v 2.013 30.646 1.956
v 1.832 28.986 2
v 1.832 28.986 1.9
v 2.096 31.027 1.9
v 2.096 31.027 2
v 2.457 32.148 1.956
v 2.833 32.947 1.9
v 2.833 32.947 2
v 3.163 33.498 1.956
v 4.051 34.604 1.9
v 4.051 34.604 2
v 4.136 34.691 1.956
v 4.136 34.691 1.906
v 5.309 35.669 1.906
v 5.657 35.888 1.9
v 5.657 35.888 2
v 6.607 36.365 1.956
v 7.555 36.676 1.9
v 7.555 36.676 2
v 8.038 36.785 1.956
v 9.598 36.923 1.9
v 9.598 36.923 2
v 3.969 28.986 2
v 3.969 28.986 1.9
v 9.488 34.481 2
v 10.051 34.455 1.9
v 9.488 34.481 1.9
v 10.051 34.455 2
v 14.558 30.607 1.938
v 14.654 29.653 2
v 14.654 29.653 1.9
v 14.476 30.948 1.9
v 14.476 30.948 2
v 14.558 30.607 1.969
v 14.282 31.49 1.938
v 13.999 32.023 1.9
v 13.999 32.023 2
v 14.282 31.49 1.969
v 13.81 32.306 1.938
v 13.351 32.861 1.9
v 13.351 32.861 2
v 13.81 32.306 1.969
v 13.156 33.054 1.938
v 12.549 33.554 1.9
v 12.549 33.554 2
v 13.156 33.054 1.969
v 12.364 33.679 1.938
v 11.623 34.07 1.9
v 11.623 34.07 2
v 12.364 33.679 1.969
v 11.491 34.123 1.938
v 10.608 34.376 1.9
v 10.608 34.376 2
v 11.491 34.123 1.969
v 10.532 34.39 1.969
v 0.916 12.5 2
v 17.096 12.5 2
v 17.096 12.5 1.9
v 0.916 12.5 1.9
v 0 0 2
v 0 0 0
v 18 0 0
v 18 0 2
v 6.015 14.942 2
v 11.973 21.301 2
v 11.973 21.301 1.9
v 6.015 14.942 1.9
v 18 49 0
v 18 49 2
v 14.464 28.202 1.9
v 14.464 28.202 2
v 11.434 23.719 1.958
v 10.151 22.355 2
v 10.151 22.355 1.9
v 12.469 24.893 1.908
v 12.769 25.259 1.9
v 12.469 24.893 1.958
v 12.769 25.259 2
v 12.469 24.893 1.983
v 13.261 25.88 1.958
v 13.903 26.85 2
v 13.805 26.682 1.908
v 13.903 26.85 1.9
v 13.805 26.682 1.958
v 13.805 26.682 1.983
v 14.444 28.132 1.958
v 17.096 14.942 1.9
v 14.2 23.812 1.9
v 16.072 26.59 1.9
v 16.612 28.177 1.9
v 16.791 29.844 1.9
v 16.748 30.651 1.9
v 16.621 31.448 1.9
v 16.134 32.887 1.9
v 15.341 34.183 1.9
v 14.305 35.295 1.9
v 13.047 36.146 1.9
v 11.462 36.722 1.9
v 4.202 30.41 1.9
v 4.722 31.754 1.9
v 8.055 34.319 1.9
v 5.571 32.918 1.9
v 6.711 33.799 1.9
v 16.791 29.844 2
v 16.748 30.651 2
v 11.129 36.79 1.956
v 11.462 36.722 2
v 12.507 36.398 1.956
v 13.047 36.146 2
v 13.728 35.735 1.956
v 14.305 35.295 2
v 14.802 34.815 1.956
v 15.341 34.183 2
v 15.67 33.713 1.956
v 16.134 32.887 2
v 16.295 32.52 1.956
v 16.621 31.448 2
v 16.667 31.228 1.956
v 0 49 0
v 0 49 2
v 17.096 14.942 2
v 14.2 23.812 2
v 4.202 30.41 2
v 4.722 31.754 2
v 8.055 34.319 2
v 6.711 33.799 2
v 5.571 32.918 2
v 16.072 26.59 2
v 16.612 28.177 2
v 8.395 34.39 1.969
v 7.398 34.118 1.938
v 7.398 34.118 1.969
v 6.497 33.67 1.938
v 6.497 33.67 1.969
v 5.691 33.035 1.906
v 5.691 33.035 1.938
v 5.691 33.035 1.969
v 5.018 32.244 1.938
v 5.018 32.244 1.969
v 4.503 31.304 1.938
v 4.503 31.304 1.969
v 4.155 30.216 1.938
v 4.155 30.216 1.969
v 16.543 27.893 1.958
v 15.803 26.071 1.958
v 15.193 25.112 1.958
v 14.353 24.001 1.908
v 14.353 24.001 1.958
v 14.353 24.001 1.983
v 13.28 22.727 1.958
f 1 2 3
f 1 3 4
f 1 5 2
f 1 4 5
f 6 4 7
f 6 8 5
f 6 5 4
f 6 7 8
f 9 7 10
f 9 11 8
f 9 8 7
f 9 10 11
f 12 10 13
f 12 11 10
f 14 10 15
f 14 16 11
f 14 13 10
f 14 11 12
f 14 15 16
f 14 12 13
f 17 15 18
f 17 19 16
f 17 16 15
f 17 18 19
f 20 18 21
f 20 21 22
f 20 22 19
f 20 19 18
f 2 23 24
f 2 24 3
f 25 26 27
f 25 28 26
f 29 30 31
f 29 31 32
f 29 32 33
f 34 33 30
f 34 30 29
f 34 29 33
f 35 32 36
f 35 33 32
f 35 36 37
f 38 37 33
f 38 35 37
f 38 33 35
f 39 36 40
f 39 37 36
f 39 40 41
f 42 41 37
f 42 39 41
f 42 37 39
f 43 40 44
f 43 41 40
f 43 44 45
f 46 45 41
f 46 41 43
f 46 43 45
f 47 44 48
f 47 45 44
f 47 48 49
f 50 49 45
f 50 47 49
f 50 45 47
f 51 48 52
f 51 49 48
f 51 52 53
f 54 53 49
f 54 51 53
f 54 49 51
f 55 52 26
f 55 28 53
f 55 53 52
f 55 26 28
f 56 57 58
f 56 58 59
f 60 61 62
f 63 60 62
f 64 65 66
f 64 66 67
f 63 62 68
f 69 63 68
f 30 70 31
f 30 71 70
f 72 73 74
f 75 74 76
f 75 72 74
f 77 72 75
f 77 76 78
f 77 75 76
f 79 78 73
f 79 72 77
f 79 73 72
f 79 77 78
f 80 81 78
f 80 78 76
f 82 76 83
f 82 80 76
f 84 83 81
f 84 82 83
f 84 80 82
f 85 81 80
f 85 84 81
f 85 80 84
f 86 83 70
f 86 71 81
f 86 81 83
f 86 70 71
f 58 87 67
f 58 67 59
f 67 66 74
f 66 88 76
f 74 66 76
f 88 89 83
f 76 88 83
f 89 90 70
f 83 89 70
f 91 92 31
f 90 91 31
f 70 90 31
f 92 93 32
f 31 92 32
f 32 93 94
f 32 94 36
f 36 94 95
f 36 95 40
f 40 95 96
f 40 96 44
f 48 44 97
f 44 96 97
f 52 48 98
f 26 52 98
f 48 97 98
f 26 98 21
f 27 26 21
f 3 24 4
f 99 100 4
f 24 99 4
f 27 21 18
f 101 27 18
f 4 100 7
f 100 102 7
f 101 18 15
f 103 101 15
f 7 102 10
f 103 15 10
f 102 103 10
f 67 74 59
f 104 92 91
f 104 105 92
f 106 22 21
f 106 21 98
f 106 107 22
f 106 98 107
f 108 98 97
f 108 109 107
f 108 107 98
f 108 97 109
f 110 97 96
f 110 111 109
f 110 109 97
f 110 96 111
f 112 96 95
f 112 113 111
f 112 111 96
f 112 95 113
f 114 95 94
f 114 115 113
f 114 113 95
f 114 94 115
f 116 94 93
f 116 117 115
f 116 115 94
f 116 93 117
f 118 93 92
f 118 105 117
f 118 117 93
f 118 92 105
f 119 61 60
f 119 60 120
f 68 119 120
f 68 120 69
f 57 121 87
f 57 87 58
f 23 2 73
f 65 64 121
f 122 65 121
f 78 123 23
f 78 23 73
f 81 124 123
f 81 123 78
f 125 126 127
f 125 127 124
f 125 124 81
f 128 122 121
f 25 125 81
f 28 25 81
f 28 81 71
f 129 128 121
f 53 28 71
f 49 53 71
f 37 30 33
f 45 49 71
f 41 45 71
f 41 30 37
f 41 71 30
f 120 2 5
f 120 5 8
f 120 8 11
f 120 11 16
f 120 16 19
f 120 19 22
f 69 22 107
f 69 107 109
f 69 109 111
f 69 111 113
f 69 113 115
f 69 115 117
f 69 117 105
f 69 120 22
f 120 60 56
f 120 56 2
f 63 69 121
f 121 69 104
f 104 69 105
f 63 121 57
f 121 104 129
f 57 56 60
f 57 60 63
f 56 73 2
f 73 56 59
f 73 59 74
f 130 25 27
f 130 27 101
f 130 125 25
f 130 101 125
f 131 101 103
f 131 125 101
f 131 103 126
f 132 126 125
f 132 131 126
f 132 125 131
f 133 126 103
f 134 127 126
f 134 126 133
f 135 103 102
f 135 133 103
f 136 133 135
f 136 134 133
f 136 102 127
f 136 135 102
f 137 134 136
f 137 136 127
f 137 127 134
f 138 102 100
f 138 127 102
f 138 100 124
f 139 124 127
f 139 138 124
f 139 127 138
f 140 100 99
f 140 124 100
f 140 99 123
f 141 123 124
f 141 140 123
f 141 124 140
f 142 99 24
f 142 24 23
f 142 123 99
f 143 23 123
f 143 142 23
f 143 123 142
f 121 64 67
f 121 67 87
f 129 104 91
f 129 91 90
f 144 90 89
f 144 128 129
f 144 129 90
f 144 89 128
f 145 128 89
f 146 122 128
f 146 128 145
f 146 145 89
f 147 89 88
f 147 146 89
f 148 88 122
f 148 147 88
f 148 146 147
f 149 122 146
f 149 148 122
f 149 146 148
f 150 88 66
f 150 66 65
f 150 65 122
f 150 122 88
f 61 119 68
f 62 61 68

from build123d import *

# Parameters (mm, degrees)
SKETCH_1_W          = 18
SKETCH_1_H          = 49
EXTRUDE_1_DEPTH     = 2
CUT_EXTRUDE_1_DEPTH = 0.1


with BuildPart() as part:
    # ｽｹｯﾁ1 → ﾎﾞｽ - 押し出し1 (new body)
    with BuildSketch(Plane.XY):
        with Locations((9, 24.5)):
            Rectangle(SKETCH_1_W, SKETCH_1_H)
    extrude(amount=EXTRUDE_1_DEPTH)

    # ｽｹｯﾁ2 → ｶｯﾄ - 押し出し1 (cut)
    with BuildSketch(Plane.XY.offset(2)):
        with BuildLine():
            Line((3.96875, 28.985576923), (1.831730769, 28.985576923))
            add(Edge.make_bspline(
                [(1.831730769, 28.985576923), (1.845658721, 29.269087784), (1.873012847, 29.825895571), (2.001112458, 30.637724291), (2.184406641, 31.413704261), (2.443564569, 32.147604926), (2.765416209, 32.845915382), (3.151383002, 33.505861918), (3.608541164, 34.12492697), (4.127019122, 34.6973716), (4.69014147, 35.222522751), (5.297740808, 35.676016457), (5.936222155, 36.059177756), (6.603648422, 36.379498348), (7.307549757, 36.619935514), (8.041538486, 36.798336312), (8.808839396, 36.905671807), (9.331625975, 36.917209206), (9.59750601, 36.923076923)],
                knots=[0, 0, 0, 0, 1.10065271, 2.161652631, 3.183658789, 4.190468796, 5.17591951, 6.163126047, 7.15150782, 8.156236427, 9.156009102, 10.134482811, 11.092018607, 12.041330605, 13.001268258, 13.972401359, 14.968799086, 16, 16, 16, 16], degree=3))
            add(Edge.make_bspline(
                [(9.59750601, 36.923076923), (9.858613978, 36.91696421), (10.371681809, 36.904952949), (11.120496585, 36.801803803), (11.833356392, 36.640248974), (12.508867804, 36.41358516), (13.141641208, 36.108891109), (13.736430136, 35.742875712), (14.300315652, 35.319558645), (14.807908233, 34.821171093), (15.274007844, 34.289115584), (15.676114258, 33.721099669), (16.020464531, 33.134432564), (16.307491425, 32.524640692), (16.518784084, 31.885982446), (16.679200107, 31.227755941), (16.769874118, 30.543147852), (16.783790303, 30.079780036), (16.790865385, 29.844200721)],
                knots=[0, 0, 0, 0, 1.111607364, 2.184268762, 3.212621178, 4.221274766, 5.211760367, 6.196651075, 7.1921475, 8.207485113, 9.220403448, 10.201281604, 11.166441695, 12.114753415, 13.065576456, 14.026450734, 14.996634279, 16, 16, 16, 16], degree=3))
            add(Edge.make_bspline(
                [(16.790865385, 29.844200721), (16.77934515, 29.512541347), (16.756506844, 28.85504275), (16.561146532, 27.888834487), (16.25603009, 26.952707833), (15.888655216, 26.199298688), (15.518048052, 25.592192239), (15.184077688, 25.092342658), (14.793111742, 24.554142953), (14.339459818, 23.979395354), (13.83250617, 23.363597946), (13.267658951, 22.707122731), (12.640890261, 22.016752297), (12.200981533, 21.545226688), (11.973031851, 21.30089393)],
                knots=[0, 0, 0, 0, 1.184426356, 2.348067706, 3.509069118, 4.696110526, 5.333549288, 6.050745305, 6.844228056, 7.710549037, 8.667450064, 9.695053472, 10.805634456, 12, 12, 12, 12], degree=3))
            Line((11.973031851, 21.30089393), (6.015136719, 14.942307692))
            Line((6.015136719, 14.942307692), (17.096153846, 14.942307692))
            Line((17.096153846, 14.942307692), (17.096153846, 12.5))
            Line((17.096153846, 12.5), (0.915865385, 12.5))
            Line((0.915865385, 12.5), (10.150841346, 22.355093149))
            add(Edge.make_bspline(
                [(10.150841346, 22.355093149), (10.375685005, 22.589804842), (10.807563657, 23.040637969), (11.418405831, 23.698835608), (11.967038948, 24.309453019), (12.457014424, 24.871336501), (12.877703095, 25.392704846), (13.251030244, 25.856672383), (13.550153283, 26.283626768), (13.874788385, 26.77852273), (14.189208509, 27.382763674), (14.45939436, 28.121180381), (14.624141811, 28.881324725), (14.643905067, 29.395008227), (14.653846154, 29.653395433)],
                knots=[0, 0, 0, 0, 1.329631726, 2.553950428, 3.673215718, 4.687767853, 5.603093632, 6.413772471, 7.123043292, 7.734684054, 8.834405432, 9.900288307, 10.943827018, 12, 12, 12, 12], degree=3))
            add(Edge.make_bspline(
                [(14.653846154, 29.653395433), (14.649520836, 29.815874233), (14.640996464, 30.136088747), (14.565764629, 30.605574357), (14.452073508, 31.058452823), (14.289160234, 31.496117178), (14.07412152, 31.91416706), (13.812365132, 32.313111345), (13.510354165, 32.698798769), (13.160982136, 33.060431029), (12.777182332, 33.391637088), (12.371728598, 33.685034883), (11.94276271, 33.930229548), (11.492093307, 34.131230841), (11.02097681, 34.288906203), (10.528502026, 34.398161895), (10.016029701, 34.466758795), (9.666098239, 34.476040036), (9.487792969, 34.480769231)],
                knots=[0, 0, 0, 0, 0.991446411, 1.95395049, 2.89581595, 3.838931463, 4.798493298, 5.75982156, 6.748411868, 7.785213223, 8.824556874, 9.840280684, 10.836137867, 11.835679398, 12.848801643, 13.863922112, 14.911575587, 16, 16, 16, 16], degree=3))
            add(Edge.make_bspline(
                [(9.487792969, 34.480769231), (9.301573553, 34.475904458), (8.935869368, 34.466350847), (8.39893809, 34.399521651), (7.886725925, 34.284229415), (7.397944407, 34.126545255), (6.931766511, 33.926121914), (6.490459354, 33.676487008), (6.075013625, 33.378602885), (5.68464835, 33.040869815), (5.324984493, 32.664852742), (5.008979855, 32.245684958), (4.732863616, 31.791019864), (4.491954367, 31.302084261), (4.296312976, 30.774441579), (4.146817077, 30.209964873), (4.028524423, 29.611105117), (3.989005739, 29.19754945), (3.96875, 28.985576923)],
                knots=[0, 0, 0, 0, 1.031018746, 2.02475058, 2.990194455, 3.934040569, 4.864654155, 5.795059489, 6.735614925, 7.690564532, 8.649604399, 9.611025574, 10.590972636, 11.591080095, 12.624614302, 13.701020113, 14.821632451, 16, 16, 16, 16], degree=3))
        make_face()
    extrude(amount=-CUT_EXTRUDE_1_DEPTH, mode=Mode.SUBTRACT)


solid = part.part
